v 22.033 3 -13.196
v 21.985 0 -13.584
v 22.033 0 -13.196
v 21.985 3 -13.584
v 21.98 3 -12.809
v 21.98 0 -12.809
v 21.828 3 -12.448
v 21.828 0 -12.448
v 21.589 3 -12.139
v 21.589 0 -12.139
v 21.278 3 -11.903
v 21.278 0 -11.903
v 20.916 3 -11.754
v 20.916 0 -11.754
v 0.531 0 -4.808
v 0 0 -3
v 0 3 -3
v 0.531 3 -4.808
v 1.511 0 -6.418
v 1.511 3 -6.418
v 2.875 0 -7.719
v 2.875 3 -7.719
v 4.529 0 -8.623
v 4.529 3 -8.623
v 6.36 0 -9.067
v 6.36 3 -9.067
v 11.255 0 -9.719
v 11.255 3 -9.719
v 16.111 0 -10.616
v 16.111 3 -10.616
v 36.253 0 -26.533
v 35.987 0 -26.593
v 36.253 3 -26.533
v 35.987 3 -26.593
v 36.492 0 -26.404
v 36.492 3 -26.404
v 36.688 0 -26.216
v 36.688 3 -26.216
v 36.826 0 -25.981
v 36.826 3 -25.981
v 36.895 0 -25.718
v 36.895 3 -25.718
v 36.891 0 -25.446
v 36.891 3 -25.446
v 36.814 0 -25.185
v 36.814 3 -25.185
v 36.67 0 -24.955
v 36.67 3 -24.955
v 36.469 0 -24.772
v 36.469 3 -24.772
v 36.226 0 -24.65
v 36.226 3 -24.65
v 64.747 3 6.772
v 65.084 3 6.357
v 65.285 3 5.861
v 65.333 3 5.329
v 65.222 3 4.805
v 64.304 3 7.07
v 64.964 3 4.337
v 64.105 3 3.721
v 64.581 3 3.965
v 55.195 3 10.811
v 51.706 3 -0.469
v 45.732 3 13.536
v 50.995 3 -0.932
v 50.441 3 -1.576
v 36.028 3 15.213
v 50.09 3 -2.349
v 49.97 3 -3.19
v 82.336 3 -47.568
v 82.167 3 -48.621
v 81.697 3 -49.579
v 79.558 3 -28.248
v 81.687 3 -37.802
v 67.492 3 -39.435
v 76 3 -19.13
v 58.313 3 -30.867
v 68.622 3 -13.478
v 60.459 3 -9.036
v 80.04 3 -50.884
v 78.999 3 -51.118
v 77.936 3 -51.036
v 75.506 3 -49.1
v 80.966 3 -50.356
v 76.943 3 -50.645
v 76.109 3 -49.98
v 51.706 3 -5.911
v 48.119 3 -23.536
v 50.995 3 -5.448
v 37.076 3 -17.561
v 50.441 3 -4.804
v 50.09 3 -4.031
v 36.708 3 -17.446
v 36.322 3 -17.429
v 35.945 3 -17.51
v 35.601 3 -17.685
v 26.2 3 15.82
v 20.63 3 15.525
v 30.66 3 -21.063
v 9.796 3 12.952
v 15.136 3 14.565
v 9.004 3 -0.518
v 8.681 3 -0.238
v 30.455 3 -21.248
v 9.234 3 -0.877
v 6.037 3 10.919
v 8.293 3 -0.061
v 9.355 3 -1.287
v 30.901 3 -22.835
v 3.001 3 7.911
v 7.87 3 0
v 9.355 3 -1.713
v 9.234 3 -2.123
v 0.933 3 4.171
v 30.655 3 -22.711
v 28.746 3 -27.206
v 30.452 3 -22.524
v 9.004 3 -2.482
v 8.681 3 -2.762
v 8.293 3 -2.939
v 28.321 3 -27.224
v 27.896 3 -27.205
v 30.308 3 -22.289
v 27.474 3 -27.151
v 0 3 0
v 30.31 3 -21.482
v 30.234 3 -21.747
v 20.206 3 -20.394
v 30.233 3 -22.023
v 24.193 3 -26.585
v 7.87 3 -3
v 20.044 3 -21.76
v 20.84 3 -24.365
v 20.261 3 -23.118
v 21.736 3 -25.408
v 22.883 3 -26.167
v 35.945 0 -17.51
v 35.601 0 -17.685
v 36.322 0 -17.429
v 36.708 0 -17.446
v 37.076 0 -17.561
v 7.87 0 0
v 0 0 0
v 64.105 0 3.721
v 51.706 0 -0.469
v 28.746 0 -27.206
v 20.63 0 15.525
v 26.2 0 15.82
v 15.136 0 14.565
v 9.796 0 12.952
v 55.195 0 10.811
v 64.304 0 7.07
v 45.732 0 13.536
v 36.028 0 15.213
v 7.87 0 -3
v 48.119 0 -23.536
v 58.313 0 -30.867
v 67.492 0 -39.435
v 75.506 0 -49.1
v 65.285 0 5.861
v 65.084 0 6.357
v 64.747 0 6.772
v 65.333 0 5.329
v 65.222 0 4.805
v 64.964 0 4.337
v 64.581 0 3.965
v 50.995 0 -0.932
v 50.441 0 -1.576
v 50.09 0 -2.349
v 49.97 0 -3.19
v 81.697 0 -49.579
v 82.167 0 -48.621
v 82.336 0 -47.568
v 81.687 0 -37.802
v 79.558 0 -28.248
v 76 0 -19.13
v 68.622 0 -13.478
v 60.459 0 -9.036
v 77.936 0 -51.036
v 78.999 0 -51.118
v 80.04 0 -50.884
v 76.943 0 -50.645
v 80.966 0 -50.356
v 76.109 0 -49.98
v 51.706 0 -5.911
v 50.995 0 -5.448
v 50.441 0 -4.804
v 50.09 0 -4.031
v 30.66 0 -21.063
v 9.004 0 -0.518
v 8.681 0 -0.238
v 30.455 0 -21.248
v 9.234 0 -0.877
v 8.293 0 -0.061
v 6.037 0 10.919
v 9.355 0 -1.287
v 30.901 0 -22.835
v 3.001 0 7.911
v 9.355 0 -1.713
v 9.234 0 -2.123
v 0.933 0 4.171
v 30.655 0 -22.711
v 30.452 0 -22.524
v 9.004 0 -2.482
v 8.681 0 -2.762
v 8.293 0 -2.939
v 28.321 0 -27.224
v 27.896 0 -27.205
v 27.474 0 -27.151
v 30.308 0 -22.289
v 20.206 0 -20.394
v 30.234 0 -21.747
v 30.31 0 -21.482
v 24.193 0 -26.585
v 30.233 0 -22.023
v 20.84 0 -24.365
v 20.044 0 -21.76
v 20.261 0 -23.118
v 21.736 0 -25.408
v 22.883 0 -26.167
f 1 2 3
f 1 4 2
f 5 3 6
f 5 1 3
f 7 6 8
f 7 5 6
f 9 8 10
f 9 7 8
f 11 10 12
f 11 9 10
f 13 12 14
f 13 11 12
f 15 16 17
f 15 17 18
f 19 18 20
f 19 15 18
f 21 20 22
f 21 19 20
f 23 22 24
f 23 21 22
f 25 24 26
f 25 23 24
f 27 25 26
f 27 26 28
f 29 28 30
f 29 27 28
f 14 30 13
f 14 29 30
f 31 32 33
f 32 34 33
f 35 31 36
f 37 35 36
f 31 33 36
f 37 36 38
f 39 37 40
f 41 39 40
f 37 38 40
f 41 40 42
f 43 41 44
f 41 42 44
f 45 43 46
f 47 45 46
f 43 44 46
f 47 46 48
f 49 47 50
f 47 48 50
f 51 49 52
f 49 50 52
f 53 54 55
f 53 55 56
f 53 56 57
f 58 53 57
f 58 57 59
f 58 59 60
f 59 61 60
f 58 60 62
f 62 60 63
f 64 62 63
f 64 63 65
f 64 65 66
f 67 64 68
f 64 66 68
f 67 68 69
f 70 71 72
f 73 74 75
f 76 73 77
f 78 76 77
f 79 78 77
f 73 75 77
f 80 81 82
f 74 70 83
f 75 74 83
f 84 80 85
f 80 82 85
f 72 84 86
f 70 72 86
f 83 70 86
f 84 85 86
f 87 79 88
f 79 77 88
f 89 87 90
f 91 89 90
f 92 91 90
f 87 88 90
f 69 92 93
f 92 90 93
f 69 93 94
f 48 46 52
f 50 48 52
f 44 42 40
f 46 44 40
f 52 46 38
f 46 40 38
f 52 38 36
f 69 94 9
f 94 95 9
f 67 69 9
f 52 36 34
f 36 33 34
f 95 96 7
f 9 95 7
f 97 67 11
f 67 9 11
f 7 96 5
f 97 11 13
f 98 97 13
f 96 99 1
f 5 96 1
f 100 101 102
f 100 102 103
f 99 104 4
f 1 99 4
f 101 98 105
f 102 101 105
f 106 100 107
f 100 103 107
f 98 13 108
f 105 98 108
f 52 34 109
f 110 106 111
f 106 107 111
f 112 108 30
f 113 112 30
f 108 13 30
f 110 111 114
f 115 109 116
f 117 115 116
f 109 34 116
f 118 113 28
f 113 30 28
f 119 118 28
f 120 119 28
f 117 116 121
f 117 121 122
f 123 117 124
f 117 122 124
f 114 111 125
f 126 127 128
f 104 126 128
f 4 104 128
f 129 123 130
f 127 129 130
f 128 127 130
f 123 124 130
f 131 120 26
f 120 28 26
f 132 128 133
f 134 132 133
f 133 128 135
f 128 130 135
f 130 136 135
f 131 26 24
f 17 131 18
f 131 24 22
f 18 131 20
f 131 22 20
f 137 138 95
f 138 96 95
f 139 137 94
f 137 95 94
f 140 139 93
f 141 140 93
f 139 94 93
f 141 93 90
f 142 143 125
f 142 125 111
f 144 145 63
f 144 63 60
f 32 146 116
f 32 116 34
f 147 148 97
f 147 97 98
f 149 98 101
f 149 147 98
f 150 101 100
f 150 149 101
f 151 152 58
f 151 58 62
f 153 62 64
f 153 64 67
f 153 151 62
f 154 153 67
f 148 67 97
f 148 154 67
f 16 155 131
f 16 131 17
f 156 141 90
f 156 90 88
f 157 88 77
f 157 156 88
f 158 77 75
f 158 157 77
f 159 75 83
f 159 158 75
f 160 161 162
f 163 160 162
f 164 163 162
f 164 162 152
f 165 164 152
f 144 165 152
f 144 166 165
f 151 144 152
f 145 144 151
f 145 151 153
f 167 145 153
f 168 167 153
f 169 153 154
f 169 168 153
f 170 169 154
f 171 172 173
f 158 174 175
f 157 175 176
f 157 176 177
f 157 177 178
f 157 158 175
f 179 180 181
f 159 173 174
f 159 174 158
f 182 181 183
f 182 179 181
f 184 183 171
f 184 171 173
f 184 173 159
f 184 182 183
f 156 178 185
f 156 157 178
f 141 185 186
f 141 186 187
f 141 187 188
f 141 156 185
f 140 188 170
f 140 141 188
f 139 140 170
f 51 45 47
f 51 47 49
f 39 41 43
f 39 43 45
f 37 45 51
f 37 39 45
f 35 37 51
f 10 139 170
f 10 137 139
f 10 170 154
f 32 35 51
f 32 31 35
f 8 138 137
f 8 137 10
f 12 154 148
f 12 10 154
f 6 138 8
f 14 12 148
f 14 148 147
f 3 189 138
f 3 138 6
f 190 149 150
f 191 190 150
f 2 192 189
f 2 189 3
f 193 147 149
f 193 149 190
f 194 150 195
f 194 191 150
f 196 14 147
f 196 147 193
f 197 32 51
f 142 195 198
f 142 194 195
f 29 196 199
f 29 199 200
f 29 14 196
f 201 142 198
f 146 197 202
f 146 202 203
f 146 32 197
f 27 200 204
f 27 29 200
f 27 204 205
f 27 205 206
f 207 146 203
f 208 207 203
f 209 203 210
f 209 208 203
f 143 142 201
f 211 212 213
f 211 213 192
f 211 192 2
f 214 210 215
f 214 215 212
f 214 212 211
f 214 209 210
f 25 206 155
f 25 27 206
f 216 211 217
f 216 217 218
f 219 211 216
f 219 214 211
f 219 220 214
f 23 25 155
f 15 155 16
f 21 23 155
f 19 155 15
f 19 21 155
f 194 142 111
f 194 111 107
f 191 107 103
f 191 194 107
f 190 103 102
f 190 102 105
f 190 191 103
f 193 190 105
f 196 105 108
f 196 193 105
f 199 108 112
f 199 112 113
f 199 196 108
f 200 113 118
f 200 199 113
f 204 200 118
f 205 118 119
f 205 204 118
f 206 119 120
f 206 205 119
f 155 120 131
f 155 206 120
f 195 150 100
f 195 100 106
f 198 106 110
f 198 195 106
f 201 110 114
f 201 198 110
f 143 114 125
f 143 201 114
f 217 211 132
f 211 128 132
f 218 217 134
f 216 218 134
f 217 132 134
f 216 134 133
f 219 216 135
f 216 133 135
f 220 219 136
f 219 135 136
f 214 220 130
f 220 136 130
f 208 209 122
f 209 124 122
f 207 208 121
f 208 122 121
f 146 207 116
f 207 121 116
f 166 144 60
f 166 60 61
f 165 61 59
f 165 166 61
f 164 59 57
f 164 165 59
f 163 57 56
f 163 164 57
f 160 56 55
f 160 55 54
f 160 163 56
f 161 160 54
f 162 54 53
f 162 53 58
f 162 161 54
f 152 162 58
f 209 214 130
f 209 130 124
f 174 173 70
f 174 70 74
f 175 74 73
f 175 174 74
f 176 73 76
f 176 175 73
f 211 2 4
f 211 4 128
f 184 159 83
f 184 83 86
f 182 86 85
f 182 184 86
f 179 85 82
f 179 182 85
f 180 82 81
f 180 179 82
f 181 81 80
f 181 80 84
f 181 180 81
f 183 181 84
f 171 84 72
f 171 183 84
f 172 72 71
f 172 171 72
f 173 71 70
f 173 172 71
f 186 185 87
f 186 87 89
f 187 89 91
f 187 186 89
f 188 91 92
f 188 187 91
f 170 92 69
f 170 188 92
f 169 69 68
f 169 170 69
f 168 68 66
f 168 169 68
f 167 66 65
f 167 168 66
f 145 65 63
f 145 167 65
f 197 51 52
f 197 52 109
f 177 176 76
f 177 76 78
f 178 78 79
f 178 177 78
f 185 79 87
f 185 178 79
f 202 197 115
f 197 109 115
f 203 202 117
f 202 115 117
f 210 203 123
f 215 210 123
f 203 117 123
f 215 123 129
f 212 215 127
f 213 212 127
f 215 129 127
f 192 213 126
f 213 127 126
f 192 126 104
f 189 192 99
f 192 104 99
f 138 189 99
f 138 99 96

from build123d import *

# Parameters (mm, degrees)
BOSS_EXTRUDE1_DEPTH = 3
FILLET1_R           = 5
FILLET2_R           = 1
FILLET3_R           = 1.5


with BuildPart() as part:
    # Sketch1 → Boss-Extrude1 (new body)
    with BuildSketch(Plane(origin=(0, 0, 0), x_dir=(1, 0, 0), z_dir=(0, 1, 0))):
        with BuildLine():
            Line((0, 0), (7.87, 0))
            ThreePointArc((7.87, 0), (9.37, 1.5), (7.87, 3))
            Line((7.87, 3), (0, 3))
            ThreePointArc((0, 3), (2.150197581, 7.11318488), (6.36, 9.067463032))
            ThreePointArc((6.36, 9.067463032), (14.423757749, 10.275919643), (22.36, 12.146912791))
            Line((22.36, 12.146912791), (18.83, 25.66))
            Line((18.83, 25.66), (28.106454985, 27.26))
            Line((28.106454985, 27.26), (40.743591673, 26.19))
            Line((40.743591673, 26.19), (29.01, 22.19))
            Line((29.01, 22.19), (36.3, 17.207480276))
            ThreePointArc((36.3, 17.207480276), (57.98254967, 30.597458725), (75.506260733, 49.1))
            ThreePointArc((75.506260733, 49.1), (79.528190594, 51.04), (82.336251949, 47.568068084))
            ThreePointArc((82.336251949, 47.568068084), (80.805010077, 32.984321852), (76, 19.13))
            ThreePointArc((76, 19.13), (64.626879168, 11.098692866), (51.706470787, 5.910936222))
            ThreePointArc((51.706470787, 5.910936222), (49.97, 3.19), (51.706470787, 0.469063778))
            Line((51.706470787, 0.469063778), (64.104871289, -3.720532265))
            ThreePointArc((64.104871289, -3.720532265), (65.332594701, -5.328564668), (64.303533653, -7.070433303))
            ThreePointArc((64.303533653, -7.070433303), (45.731782679, -13.536259881), (26.199767539, -15.820385992))
            ThreePointArc((26.199767539, -15.820385992), (17.868444589, -15.127380639), (9.796210687, -12.952469527))
            ThreePointArc((9.796210687, -12.952469527), (3.000778454, -7.91122088), (0, 0))
        make_face()
    extrude(amount=BOSS_EXTRUDE1_DEPTH)

    # Fillet1
    fillet1_edges = [part.edges().sort_by_distance(p)[0] for p in [
        (18.83, 1.5, -25.66),
        (28.106454985, 1.5, -27.26),
    ]]
    fillet(fillet1_edges, radius=FILLET1_R)

    # Fillet2
    fillet2_edges = [part.edges().sort_by_distance(p)[0] for p in [
        (40.743591673, 1.5, -26.19),
        (29.01, 1.5, -22.19),
    ]]
    fillet(fillet2_edges, radius=FILLET2_R)

    # Fillet3
    fillet3_edges = [part.edges().sort_by_distance(p)[0] for p in [
        (22.36, 1.5, -12.146912791),
        (36.3, 1.5, -17.207480276),
    ]]
    fillet(fillet3_edges, radius=FILLET3_R)


solid = part.part
